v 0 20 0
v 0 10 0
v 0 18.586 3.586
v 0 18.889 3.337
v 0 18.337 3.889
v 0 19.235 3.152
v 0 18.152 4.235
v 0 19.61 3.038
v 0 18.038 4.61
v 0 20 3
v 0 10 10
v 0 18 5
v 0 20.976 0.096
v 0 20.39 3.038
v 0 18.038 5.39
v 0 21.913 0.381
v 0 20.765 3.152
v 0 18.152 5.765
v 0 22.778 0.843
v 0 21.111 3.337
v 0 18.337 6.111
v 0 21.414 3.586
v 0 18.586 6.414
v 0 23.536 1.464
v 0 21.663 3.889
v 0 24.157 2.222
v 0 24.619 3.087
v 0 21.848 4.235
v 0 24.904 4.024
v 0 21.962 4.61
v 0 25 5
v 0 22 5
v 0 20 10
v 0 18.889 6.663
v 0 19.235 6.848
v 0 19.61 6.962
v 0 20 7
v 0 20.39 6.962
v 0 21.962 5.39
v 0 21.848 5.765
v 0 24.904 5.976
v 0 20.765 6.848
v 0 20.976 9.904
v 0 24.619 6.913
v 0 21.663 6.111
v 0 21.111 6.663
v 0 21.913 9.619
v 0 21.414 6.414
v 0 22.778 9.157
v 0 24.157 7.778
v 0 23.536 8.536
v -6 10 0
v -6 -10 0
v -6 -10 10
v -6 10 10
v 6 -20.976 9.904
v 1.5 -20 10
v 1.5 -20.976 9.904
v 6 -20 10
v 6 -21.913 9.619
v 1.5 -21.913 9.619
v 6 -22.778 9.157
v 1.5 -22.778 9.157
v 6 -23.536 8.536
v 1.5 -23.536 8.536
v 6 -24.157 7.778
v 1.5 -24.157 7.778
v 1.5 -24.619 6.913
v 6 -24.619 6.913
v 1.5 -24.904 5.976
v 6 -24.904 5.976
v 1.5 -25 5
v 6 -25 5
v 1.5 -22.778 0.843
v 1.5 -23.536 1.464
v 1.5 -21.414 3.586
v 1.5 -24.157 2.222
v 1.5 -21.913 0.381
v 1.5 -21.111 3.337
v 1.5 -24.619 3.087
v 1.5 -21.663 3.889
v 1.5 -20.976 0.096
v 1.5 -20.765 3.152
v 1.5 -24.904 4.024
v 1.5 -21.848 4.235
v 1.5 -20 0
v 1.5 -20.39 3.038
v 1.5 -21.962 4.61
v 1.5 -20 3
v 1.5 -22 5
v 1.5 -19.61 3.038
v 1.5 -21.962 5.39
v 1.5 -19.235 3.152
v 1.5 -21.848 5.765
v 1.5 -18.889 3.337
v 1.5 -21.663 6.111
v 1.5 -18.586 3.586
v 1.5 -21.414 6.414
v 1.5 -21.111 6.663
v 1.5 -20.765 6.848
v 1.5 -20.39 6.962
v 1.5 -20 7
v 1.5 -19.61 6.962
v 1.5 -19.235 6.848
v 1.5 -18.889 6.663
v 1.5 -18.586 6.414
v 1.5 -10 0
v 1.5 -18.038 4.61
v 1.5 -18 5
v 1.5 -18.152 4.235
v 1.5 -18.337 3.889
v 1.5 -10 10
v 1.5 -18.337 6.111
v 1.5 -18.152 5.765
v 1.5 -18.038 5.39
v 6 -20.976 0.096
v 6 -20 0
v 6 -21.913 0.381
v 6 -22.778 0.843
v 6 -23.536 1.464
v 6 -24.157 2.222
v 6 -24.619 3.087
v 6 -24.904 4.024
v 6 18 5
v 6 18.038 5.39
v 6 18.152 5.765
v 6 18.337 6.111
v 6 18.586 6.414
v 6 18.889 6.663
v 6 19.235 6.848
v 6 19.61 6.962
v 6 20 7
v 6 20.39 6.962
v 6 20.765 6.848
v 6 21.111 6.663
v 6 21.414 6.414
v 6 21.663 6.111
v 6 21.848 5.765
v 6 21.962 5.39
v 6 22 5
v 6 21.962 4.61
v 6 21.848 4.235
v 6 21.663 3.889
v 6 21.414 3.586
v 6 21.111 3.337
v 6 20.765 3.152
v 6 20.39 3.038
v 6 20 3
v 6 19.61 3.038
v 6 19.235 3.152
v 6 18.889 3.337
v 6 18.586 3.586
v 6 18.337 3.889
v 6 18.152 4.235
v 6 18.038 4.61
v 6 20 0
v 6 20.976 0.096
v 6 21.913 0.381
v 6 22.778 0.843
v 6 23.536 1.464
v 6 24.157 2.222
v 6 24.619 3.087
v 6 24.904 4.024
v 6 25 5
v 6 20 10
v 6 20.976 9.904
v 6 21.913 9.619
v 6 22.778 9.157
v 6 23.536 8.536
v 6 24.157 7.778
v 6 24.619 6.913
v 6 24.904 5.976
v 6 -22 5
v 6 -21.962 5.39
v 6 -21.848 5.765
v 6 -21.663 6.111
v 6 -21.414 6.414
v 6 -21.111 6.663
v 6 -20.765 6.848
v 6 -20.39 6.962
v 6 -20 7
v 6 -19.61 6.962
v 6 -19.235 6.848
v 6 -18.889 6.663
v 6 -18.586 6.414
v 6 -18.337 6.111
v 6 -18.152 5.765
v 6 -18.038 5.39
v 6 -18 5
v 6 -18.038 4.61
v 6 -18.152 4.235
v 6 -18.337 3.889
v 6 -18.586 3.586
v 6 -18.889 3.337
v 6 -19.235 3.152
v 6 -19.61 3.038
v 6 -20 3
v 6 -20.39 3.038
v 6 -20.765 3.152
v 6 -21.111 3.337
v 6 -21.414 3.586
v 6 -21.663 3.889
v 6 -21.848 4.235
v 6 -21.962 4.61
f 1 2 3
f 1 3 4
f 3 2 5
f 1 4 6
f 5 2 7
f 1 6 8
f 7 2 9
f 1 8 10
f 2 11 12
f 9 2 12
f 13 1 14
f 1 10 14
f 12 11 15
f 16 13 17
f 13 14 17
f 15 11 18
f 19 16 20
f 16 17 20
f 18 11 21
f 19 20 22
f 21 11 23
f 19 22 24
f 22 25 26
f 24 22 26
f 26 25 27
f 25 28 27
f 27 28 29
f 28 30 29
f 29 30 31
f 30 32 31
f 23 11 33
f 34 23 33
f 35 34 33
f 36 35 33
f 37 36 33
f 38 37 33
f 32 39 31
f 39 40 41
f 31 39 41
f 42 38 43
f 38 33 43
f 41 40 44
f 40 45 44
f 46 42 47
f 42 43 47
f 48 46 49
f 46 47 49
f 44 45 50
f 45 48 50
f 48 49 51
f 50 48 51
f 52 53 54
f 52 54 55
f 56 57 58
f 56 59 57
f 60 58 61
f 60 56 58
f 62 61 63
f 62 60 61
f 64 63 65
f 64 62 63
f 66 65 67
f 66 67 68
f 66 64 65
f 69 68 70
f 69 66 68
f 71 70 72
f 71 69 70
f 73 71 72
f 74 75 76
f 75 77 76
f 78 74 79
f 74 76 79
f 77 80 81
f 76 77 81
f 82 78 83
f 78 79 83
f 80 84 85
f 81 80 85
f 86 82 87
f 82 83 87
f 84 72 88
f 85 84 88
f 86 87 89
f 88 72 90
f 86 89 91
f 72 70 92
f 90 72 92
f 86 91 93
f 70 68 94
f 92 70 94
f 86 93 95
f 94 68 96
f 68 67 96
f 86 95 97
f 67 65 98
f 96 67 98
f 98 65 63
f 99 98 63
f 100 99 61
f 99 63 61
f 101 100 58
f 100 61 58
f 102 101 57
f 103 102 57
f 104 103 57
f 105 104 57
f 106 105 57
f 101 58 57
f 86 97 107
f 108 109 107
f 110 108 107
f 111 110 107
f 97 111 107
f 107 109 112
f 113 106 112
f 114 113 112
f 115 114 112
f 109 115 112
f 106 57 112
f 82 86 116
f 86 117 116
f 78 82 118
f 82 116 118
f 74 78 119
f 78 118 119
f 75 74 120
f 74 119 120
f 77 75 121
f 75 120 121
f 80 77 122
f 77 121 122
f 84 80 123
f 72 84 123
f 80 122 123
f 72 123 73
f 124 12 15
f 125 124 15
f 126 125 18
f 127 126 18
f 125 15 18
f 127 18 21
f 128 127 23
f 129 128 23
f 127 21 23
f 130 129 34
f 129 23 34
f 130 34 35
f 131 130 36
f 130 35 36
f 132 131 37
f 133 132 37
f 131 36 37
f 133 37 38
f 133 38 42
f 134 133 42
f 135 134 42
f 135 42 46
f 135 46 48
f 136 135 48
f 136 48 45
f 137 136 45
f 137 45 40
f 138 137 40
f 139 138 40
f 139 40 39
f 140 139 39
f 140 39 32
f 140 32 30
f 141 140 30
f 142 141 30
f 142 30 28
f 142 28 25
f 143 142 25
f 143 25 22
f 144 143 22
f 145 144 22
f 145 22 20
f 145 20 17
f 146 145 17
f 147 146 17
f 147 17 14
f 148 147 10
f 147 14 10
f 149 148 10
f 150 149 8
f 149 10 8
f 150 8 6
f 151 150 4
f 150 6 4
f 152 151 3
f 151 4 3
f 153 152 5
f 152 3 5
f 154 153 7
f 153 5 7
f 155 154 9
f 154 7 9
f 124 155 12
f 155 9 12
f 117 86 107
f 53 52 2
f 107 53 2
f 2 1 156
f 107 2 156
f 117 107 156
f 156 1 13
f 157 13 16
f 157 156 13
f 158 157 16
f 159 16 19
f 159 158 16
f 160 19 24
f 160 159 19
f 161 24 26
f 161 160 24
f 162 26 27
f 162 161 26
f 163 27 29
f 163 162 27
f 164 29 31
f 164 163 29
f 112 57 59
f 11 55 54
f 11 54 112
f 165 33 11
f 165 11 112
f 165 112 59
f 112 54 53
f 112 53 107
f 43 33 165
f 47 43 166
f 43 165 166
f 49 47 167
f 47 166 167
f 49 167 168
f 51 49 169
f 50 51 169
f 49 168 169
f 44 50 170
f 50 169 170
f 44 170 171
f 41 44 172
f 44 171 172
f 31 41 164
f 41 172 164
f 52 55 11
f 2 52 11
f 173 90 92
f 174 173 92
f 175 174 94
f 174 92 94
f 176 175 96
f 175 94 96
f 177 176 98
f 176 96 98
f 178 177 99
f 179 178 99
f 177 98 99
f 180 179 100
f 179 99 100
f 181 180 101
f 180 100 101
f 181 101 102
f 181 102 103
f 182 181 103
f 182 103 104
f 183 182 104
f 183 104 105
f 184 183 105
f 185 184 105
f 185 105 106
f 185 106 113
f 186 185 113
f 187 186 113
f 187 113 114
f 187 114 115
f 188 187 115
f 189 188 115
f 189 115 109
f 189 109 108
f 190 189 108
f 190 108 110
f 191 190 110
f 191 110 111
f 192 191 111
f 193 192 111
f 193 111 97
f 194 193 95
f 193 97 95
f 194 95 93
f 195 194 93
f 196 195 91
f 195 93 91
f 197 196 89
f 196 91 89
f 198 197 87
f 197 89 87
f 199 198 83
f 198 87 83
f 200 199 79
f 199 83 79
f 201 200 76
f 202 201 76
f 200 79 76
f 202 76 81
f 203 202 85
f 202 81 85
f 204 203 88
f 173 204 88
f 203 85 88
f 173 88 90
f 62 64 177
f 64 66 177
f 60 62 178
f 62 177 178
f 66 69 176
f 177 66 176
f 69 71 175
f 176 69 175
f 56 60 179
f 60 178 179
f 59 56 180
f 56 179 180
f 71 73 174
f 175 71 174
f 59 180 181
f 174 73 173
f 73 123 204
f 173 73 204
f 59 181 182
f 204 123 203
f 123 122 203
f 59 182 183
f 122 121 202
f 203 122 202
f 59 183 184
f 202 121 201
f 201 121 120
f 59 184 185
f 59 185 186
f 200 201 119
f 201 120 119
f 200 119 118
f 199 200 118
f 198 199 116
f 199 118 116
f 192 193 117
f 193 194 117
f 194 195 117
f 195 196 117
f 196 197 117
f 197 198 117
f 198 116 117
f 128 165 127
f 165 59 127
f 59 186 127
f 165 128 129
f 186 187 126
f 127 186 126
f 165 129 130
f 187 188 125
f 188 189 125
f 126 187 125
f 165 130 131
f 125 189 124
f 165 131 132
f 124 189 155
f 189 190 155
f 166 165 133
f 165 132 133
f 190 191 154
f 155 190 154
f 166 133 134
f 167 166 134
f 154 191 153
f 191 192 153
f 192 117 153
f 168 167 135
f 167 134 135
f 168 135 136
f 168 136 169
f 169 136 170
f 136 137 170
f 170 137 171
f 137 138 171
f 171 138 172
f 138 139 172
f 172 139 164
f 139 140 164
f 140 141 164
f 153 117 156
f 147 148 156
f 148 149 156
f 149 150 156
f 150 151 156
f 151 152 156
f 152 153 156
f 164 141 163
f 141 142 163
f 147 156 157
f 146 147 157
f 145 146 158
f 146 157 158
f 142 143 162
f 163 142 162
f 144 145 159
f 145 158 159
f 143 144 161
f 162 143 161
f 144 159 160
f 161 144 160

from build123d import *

# Parameters (mm, degrees)
SKETCH1_W           = 12
SKETCH1_H           = 50
BOSS_EXTRUDE1_DEPTH = 10
SKETCH2_W           = 7.5
SKETCH2_H           = 15
SKETCH2_W_2         = 6
CUT_EXTRUDE1_DEPTH  = 10
SKETCH3_R           = 2
CUT_EXTRUDE2_DEPTH  = 10
FILLET1_R           = 5


with BuildPart() as part:
    # Sketch1 → Boss-Extrude1 (new body)
    with BuildSketch(Plane.XY):
        Rectangle(SKETCH1_W, SKETCH1_H)
    extrude(amount=BOSS_EXTRUDE1_DEPTH)

    # Sketch2 → Cut-Extrude1 (cut)
    with BuildSketch(Plane.XY.offset(10)):
        with Locations((-2.25, -17.5)):
            Rectangle(SKETCH2_W, SKETCH2_H)
        with Locations((-3, 17.5)):
            Rectangle(SKETCH2_W_2, SKETCH2_H)
    extrude(amount=-CUT_EXTRUDE1_DEPTH, mode=Mode.SUBTRACT)

    # Sketch3 → Cut-Extrude2 (cut)
    with BuildSketch(Plane.ZY):
        with Locations(Location((5, 20, 0), (0, 0, 270))):
            Circle(SKETCH3_R)
        with Locations(Location((5, -20, 0), (0, 0, 270))):
            Circle(SKETCH3_R)
    extrude(amount=-CUT_EXTRUDE2_DEPTH, mode=Mode.SUBTRACT)

    # Fillet1
    fillet1_edges = [part.edges().sort_by_distance(p)[0] for p in [
        (3.75, -25, 0),
        (3.75, -25, 10),
        (3, 25, 0),
        (3, 25, 10),
    ]]
    fillet(fillet1_edges, radius=FILLET1_R - 0.0001)  # a hair under: the kernel refuses the full size


solid = part.part
